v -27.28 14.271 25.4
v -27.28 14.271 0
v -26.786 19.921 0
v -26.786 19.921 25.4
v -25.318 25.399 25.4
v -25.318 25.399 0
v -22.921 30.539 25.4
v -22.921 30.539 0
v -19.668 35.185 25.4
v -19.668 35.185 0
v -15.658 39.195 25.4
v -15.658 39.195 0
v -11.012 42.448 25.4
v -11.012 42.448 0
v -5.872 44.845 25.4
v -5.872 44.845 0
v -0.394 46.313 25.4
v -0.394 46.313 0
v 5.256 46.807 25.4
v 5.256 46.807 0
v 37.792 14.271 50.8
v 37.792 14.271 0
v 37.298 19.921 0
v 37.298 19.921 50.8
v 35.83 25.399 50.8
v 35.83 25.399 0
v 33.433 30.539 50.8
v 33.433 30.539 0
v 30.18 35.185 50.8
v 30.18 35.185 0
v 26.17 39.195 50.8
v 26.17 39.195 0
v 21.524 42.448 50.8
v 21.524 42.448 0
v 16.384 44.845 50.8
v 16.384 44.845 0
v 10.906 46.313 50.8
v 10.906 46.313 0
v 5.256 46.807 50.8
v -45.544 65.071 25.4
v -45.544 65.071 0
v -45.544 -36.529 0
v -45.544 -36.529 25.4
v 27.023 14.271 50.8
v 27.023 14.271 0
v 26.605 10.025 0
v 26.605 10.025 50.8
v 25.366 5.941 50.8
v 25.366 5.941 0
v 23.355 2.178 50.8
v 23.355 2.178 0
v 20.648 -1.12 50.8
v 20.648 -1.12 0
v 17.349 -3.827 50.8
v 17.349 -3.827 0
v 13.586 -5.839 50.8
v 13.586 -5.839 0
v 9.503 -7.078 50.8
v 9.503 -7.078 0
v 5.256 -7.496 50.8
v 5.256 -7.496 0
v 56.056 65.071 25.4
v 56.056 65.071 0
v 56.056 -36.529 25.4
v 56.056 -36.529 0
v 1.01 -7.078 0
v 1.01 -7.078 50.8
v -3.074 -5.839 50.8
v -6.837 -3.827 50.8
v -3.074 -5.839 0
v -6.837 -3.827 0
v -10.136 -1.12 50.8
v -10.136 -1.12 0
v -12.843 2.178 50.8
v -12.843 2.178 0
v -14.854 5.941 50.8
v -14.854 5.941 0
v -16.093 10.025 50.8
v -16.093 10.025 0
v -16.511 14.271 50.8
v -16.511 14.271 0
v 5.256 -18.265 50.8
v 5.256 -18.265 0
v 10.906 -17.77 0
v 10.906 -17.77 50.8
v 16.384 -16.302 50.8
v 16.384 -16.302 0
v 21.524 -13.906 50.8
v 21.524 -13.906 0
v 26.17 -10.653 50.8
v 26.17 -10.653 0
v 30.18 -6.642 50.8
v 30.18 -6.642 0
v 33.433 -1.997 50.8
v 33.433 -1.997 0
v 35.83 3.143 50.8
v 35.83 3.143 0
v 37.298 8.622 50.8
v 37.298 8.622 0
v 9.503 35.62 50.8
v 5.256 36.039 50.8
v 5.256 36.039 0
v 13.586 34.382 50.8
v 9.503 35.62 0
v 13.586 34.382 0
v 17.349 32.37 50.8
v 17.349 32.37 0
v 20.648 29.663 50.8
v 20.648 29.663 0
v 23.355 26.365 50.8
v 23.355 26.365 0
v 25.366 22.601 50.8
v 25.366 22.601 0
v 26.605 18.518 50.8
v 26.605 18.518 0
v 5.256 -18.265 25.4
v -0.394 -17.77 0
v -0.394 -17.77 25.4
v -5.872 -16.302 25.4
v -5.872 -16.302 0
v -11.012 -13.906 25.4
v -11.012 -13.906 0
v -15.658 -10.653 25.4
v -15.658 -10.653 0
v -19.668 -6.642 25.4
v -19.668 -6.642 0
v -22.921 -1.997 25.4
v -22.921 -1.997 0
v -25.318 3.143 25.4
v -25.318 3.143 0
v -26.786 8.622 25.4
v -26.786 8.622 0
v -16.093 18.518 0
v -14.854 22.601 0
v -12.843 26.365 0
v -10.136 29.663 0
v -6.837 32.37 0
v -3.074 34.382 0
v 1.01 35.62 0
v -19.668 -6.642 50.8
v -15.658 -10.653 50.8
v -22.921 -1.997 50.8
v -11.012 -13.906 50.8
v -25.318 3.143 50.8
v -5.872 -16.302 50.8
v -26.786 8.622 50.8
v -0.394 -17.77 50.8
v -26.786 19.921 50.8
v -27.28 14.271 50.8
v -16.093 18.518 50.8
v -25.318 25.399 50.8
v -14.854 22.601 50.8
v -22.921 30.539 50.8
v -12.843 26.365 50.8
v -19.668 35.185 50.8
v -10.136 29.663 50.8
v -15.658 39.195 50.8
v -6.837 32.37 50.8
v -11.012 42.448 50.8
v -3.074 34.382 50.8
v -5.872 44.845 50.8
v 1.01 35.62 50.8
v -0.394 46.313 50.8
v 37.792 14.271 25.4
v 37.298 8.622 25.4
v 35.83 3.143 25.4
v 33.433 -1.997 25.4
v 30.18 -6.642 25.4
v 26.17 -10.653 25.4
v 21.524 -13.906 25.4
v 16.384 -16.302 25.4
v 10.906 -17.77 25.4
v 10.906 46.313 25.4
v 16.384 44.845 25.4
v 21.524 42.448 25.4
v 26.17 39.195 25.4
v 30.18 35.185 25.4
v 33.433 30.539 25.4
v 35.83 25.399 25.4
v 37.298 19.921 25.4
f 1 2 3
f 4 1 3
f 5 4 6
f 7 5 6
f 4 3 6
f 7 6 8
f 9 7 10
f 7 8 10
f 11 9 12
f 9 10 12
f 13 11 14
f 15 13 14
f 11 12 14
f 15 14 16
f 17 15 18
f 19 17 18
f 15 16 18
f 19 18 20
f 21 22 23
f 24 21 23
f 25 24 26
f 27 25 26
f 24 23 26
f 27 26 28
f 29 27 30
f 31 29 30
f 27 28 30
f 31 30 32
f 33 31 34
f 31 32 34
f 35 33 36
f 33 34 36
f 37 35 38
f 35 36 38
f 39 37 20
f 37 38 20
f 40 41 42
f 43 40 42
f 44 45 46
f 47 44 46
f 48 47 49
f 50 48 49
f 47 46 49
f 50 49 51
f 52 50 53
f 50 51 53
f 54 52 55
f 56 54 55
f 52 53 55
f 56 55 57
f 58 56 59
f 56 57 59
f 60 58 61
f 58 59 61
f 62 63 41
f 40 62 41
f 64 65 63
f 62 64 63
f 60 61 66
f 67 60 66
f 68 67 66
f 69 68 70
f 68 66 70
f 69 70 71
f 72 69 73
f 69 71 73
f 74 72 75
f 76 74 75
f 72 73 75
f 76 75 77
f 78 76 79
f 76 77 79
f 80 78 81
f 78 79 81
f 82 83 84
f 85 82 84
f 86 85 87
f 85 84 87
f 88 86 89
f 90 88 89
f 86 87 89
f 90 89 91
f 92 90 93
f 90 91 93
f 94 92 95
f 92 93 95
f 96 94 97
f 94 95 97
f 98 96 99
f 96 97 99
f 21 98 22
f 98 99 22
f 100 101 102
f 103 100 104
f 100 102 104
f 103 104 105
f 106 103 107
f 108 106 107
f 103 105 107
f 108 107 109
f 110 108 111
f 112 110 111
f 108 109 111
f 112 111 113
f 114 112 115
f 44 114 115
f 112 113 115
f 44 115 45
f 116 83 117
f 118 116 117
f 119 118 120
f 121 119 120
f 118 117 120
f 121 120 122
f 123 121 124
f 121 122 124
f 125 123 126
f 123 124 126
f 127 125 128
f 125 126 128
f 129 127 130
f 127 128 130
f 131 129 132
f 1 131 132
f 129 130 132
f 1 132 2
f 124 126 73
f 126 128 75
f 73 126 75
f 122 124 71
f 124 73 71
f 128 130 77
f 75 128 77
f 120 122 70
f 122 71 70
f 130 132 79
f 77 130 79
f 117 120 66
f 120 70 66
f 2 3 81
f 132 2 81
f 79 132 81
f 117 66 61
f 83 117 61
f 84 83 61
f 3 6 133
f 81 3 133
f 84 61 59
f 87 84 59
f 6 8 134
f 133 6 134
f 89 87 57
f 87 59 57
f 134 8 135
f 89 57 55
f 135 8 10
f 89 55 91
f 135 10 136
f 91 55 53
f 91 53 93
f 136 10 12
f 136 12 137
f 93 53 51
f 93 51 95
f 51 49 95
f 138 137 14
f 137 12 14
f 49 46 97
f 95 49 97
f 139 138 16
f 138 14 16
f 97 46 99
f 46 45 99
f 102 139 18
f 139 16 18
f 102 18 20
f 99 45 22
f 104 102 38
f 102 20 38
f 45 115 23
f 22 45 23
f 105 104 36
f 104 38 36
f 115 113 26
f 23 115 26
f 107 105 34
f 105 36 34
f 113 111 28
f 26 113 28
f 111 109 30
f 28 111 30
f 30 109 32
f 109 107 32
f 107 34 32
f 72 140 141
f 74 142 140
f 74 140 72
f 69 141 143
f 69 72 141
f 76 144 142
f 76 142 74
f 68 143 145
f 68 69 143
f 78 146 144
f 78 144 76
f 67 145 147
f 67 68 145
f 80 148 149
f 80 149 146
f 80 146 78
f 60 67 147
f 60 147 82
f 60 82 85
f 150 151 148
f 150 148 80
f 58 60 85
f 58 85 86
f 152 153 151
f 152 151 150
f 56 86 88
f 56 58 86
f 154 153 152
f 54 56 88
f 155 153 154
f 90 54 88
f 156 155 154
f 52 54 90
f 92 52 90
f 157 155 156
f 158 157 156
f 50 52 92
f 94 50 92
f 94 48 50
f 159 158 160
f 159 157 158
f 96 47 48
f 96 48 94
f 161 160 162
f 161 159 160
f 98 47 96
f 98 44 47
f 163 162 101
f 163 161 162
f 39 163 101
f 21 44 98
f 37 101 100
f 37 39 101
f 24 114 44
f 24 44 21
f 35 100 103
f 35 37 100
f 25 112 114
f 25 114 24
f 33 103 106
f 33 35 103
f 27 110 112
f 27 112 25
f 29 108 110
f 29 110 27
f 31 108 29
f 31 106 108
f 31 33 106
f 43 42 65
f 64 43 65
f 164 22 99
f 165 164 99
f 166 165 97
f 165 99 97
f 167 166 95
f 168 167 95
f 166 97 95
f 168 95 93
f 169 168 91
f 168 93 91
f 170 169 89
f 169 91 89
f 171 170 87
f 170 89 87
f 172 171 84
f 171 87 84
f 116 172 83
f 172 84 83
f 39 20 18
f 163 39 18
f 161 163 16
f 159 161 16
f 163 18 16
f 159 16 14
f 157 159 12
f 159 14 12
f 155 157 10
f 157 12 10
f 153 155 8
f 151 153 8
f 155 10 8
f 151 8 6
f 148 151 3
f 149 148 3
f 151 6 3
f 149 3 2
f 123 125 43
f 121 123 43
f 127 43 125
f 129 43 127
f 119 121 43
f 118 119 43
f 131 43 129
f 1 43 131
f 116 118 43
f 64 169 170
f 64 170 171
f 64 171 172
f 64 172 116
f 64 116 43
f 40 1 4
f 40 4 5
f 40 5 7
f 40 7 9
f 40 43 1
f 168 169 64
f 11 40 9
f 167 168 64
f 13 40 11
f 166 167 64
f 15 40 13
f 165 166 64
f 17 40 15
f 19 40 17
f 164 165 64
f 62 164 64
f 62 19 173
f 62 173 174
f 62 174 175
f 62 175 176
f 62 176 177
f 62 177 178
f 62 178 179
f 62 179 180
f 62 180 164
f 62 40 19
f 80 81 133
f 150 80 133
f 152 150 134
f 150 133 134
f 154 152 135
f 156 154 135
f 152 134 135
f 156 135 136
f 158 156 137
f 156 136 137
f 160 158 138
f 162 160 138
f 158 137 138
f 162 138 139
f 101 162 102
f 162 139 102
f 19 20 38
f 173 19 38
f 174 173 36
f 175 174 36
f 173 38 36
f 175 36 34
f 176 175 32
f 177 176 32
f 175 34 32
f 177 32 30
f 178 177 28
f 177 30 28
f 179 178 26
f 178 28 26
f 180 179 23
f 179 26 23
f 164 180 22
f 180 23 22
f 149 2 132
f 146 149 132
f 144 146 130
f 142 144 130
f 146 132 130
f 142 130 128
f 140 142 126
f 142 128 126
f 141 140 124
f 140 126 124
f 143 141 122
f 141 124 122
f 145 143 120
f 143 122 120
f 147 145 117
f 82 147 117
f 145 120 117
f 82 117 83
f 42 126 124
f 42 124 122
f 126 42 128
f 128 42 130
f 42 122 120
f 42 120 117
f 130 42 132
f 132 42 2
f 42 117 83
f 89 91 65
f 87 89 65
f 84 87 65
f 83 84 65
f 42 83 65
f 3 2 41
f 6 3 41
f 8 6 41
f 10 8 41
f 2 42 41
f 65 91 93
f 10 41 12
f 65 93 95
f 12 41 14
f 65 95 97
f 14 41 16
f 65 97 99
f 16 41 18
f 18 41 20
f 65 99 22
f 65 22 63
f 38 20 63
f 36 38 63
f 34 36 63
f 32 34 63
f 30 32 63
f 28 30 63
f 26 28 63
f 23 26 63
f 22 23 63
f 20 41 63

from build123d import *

# Parameters (mm, degrees)
F1_DEPTH = 25.4
F2_DEPTH = 50.8


with BuildPart() as f1:
    # F0 (on Top) → F1 (new body)
    with BuildSketch(Plane.XY):
        with BuildLine():
            Line((5.2561312914, 65.071428316), (-45.5438687086, 65.071428316))
            Line((-45.5438687086, 65.071428316), (-45.5438687086, 14.271428316))
            Line((-45.5438687086, 14.271428316), (-27.2798932146, 14.271428316))
            ThreePointArc((-27.2798932146, 14.271428316), (-17.7503122697, 37.2778718771), (5.2561312914, 46.807452822))
            Line((5.2561312914, 46.807452822), (5.2561312914, 65.071428316))
        make_face()
        with BuildLine():
            Line((-27.2798932146, 14.271428316), (-45.5438687086, 14.271428316))
            Line((-45.5438687086, 14.271428316), (-45.5438687086, -36.528571684))
            Line((-45.5438687086, -36.528571684), (5.2561312914, -36.528571684))
            Line((5.2561312914, -36.528571684), (5.2561312914, -18.26459619))
            ThreePointArc((5.2561312914, -18.26459619), (-17.7503122697, -8.735015245), (-27.2798932146, 14.271428316))
        make_face()
        with BuildLine():
            Line((56.0561312914, -36.528571684), (56.0561312914, 14.271428316))
            Line((56.0561312914, 14.271428316), (37.7921557974, 14.271428316))
            ThreePointArc((37.7921557974, 14.271428316), (28.2625748524, -8.735015245), (5.2561312914, -18.26459619))
            Line((5.2561312914, -18.26459619), (5.2561312914, -36.528571684))
            Line((5.2561312914, -36.528571684), (56.0561312914, -36.528571684))
        make_face()
        with BuildLine():
            Line((56.0561312914, 65.071428316), (5.2561312914, 65.071428316))
            Line((5.2561312914, 65.071428316), (5.2561312914, 46.807452822))
            ThreePointArc((5.2561312914, 46.807452822), (28.2625748524, 37.2778718771), (37.7921557974, 14.271428316))
            Line((37.7921557974, 14.271428316), (56.0561312914, 14.271428316))
            Line((56.0561312914, 14.271428316), (56.0561312914, 65.071428316))
        make_face()
    extrude(amount=F1_DEPTH)


with BuildPart() as f2:
    # F0 (on Top) → F2 (new body)
    with BuildSketch(Plane.XY):
        with BuildLine():
            Line((5.2561312914, 36.0387259762), (5.2561312914, 46.807452822))
            ThreePointArc((5.2561312914, 46.807452822), (-17.7503122697, 37.2778718771), (-27.2798932146, 14.271428316))
            Line((-27.2798932146, 14.271428316), (-16.5111663688, 14.271428316))
            ThreePointArc((-16.5111663688, 14.271428316), (-10.1356724922, 29.6632320996), (5.2561312914, 36.0387259762))
        make_face()
        with BuildLine():
            ThreePointArc((37.7921557974, 14.271428316), (28.2625748524, 37.2778718771), (5.2561312914, 46.807452822))
            Line((5.2561312914, 46.807452822), (5.2561312914, 36.0387259762))
            ThreePointArc((5.2561312914, 36.0387259762), (20.647935075, 29.6632320996), (27.0234289516, 14.271428316))
            Line((27.0234289516, 14.271428316), (37.7921557974, 14.271428316))
        make_face()
        with BuildLine():
            ThreePointArc((5.2561312914, -18.26459619), (28.2625748524, -8.735015245), (37.7921557974, 14.271428316))
            Line((37.7921557974, 14.271428316), (27.0234289516, 14.271428316))
            ThreePointArc((27.0234289516, 14.271428316), (20.647935075, -1.1203754676), (5.2561312914, -7.4958693441))
            Line((5.2561312914, -7.4958693441), (5.2561312914, -18.26459619))
        make_face()
        with BuildLine():
            Line((-16.5111663688, 14.271428316), (-27.2798932146, 14.271428316))
            ThreePointArc((-27.2798932146, 14.271428316), (-17.7503122697, -8.735015245), (5.2561312914, -18.26459619))
            Line((5.2561312914, -18.26459619), (5.2561312914, -7.4958693441))
            ThreePointArc((5.2561312914, -7.4958693441), (-10.1356724922, -1.1203754676), (-16.5111663688, 14.271428316))
        make_face()
    extrude(amount=F2_DEPTH)


solid = Compound([f1.part, f2.part])
